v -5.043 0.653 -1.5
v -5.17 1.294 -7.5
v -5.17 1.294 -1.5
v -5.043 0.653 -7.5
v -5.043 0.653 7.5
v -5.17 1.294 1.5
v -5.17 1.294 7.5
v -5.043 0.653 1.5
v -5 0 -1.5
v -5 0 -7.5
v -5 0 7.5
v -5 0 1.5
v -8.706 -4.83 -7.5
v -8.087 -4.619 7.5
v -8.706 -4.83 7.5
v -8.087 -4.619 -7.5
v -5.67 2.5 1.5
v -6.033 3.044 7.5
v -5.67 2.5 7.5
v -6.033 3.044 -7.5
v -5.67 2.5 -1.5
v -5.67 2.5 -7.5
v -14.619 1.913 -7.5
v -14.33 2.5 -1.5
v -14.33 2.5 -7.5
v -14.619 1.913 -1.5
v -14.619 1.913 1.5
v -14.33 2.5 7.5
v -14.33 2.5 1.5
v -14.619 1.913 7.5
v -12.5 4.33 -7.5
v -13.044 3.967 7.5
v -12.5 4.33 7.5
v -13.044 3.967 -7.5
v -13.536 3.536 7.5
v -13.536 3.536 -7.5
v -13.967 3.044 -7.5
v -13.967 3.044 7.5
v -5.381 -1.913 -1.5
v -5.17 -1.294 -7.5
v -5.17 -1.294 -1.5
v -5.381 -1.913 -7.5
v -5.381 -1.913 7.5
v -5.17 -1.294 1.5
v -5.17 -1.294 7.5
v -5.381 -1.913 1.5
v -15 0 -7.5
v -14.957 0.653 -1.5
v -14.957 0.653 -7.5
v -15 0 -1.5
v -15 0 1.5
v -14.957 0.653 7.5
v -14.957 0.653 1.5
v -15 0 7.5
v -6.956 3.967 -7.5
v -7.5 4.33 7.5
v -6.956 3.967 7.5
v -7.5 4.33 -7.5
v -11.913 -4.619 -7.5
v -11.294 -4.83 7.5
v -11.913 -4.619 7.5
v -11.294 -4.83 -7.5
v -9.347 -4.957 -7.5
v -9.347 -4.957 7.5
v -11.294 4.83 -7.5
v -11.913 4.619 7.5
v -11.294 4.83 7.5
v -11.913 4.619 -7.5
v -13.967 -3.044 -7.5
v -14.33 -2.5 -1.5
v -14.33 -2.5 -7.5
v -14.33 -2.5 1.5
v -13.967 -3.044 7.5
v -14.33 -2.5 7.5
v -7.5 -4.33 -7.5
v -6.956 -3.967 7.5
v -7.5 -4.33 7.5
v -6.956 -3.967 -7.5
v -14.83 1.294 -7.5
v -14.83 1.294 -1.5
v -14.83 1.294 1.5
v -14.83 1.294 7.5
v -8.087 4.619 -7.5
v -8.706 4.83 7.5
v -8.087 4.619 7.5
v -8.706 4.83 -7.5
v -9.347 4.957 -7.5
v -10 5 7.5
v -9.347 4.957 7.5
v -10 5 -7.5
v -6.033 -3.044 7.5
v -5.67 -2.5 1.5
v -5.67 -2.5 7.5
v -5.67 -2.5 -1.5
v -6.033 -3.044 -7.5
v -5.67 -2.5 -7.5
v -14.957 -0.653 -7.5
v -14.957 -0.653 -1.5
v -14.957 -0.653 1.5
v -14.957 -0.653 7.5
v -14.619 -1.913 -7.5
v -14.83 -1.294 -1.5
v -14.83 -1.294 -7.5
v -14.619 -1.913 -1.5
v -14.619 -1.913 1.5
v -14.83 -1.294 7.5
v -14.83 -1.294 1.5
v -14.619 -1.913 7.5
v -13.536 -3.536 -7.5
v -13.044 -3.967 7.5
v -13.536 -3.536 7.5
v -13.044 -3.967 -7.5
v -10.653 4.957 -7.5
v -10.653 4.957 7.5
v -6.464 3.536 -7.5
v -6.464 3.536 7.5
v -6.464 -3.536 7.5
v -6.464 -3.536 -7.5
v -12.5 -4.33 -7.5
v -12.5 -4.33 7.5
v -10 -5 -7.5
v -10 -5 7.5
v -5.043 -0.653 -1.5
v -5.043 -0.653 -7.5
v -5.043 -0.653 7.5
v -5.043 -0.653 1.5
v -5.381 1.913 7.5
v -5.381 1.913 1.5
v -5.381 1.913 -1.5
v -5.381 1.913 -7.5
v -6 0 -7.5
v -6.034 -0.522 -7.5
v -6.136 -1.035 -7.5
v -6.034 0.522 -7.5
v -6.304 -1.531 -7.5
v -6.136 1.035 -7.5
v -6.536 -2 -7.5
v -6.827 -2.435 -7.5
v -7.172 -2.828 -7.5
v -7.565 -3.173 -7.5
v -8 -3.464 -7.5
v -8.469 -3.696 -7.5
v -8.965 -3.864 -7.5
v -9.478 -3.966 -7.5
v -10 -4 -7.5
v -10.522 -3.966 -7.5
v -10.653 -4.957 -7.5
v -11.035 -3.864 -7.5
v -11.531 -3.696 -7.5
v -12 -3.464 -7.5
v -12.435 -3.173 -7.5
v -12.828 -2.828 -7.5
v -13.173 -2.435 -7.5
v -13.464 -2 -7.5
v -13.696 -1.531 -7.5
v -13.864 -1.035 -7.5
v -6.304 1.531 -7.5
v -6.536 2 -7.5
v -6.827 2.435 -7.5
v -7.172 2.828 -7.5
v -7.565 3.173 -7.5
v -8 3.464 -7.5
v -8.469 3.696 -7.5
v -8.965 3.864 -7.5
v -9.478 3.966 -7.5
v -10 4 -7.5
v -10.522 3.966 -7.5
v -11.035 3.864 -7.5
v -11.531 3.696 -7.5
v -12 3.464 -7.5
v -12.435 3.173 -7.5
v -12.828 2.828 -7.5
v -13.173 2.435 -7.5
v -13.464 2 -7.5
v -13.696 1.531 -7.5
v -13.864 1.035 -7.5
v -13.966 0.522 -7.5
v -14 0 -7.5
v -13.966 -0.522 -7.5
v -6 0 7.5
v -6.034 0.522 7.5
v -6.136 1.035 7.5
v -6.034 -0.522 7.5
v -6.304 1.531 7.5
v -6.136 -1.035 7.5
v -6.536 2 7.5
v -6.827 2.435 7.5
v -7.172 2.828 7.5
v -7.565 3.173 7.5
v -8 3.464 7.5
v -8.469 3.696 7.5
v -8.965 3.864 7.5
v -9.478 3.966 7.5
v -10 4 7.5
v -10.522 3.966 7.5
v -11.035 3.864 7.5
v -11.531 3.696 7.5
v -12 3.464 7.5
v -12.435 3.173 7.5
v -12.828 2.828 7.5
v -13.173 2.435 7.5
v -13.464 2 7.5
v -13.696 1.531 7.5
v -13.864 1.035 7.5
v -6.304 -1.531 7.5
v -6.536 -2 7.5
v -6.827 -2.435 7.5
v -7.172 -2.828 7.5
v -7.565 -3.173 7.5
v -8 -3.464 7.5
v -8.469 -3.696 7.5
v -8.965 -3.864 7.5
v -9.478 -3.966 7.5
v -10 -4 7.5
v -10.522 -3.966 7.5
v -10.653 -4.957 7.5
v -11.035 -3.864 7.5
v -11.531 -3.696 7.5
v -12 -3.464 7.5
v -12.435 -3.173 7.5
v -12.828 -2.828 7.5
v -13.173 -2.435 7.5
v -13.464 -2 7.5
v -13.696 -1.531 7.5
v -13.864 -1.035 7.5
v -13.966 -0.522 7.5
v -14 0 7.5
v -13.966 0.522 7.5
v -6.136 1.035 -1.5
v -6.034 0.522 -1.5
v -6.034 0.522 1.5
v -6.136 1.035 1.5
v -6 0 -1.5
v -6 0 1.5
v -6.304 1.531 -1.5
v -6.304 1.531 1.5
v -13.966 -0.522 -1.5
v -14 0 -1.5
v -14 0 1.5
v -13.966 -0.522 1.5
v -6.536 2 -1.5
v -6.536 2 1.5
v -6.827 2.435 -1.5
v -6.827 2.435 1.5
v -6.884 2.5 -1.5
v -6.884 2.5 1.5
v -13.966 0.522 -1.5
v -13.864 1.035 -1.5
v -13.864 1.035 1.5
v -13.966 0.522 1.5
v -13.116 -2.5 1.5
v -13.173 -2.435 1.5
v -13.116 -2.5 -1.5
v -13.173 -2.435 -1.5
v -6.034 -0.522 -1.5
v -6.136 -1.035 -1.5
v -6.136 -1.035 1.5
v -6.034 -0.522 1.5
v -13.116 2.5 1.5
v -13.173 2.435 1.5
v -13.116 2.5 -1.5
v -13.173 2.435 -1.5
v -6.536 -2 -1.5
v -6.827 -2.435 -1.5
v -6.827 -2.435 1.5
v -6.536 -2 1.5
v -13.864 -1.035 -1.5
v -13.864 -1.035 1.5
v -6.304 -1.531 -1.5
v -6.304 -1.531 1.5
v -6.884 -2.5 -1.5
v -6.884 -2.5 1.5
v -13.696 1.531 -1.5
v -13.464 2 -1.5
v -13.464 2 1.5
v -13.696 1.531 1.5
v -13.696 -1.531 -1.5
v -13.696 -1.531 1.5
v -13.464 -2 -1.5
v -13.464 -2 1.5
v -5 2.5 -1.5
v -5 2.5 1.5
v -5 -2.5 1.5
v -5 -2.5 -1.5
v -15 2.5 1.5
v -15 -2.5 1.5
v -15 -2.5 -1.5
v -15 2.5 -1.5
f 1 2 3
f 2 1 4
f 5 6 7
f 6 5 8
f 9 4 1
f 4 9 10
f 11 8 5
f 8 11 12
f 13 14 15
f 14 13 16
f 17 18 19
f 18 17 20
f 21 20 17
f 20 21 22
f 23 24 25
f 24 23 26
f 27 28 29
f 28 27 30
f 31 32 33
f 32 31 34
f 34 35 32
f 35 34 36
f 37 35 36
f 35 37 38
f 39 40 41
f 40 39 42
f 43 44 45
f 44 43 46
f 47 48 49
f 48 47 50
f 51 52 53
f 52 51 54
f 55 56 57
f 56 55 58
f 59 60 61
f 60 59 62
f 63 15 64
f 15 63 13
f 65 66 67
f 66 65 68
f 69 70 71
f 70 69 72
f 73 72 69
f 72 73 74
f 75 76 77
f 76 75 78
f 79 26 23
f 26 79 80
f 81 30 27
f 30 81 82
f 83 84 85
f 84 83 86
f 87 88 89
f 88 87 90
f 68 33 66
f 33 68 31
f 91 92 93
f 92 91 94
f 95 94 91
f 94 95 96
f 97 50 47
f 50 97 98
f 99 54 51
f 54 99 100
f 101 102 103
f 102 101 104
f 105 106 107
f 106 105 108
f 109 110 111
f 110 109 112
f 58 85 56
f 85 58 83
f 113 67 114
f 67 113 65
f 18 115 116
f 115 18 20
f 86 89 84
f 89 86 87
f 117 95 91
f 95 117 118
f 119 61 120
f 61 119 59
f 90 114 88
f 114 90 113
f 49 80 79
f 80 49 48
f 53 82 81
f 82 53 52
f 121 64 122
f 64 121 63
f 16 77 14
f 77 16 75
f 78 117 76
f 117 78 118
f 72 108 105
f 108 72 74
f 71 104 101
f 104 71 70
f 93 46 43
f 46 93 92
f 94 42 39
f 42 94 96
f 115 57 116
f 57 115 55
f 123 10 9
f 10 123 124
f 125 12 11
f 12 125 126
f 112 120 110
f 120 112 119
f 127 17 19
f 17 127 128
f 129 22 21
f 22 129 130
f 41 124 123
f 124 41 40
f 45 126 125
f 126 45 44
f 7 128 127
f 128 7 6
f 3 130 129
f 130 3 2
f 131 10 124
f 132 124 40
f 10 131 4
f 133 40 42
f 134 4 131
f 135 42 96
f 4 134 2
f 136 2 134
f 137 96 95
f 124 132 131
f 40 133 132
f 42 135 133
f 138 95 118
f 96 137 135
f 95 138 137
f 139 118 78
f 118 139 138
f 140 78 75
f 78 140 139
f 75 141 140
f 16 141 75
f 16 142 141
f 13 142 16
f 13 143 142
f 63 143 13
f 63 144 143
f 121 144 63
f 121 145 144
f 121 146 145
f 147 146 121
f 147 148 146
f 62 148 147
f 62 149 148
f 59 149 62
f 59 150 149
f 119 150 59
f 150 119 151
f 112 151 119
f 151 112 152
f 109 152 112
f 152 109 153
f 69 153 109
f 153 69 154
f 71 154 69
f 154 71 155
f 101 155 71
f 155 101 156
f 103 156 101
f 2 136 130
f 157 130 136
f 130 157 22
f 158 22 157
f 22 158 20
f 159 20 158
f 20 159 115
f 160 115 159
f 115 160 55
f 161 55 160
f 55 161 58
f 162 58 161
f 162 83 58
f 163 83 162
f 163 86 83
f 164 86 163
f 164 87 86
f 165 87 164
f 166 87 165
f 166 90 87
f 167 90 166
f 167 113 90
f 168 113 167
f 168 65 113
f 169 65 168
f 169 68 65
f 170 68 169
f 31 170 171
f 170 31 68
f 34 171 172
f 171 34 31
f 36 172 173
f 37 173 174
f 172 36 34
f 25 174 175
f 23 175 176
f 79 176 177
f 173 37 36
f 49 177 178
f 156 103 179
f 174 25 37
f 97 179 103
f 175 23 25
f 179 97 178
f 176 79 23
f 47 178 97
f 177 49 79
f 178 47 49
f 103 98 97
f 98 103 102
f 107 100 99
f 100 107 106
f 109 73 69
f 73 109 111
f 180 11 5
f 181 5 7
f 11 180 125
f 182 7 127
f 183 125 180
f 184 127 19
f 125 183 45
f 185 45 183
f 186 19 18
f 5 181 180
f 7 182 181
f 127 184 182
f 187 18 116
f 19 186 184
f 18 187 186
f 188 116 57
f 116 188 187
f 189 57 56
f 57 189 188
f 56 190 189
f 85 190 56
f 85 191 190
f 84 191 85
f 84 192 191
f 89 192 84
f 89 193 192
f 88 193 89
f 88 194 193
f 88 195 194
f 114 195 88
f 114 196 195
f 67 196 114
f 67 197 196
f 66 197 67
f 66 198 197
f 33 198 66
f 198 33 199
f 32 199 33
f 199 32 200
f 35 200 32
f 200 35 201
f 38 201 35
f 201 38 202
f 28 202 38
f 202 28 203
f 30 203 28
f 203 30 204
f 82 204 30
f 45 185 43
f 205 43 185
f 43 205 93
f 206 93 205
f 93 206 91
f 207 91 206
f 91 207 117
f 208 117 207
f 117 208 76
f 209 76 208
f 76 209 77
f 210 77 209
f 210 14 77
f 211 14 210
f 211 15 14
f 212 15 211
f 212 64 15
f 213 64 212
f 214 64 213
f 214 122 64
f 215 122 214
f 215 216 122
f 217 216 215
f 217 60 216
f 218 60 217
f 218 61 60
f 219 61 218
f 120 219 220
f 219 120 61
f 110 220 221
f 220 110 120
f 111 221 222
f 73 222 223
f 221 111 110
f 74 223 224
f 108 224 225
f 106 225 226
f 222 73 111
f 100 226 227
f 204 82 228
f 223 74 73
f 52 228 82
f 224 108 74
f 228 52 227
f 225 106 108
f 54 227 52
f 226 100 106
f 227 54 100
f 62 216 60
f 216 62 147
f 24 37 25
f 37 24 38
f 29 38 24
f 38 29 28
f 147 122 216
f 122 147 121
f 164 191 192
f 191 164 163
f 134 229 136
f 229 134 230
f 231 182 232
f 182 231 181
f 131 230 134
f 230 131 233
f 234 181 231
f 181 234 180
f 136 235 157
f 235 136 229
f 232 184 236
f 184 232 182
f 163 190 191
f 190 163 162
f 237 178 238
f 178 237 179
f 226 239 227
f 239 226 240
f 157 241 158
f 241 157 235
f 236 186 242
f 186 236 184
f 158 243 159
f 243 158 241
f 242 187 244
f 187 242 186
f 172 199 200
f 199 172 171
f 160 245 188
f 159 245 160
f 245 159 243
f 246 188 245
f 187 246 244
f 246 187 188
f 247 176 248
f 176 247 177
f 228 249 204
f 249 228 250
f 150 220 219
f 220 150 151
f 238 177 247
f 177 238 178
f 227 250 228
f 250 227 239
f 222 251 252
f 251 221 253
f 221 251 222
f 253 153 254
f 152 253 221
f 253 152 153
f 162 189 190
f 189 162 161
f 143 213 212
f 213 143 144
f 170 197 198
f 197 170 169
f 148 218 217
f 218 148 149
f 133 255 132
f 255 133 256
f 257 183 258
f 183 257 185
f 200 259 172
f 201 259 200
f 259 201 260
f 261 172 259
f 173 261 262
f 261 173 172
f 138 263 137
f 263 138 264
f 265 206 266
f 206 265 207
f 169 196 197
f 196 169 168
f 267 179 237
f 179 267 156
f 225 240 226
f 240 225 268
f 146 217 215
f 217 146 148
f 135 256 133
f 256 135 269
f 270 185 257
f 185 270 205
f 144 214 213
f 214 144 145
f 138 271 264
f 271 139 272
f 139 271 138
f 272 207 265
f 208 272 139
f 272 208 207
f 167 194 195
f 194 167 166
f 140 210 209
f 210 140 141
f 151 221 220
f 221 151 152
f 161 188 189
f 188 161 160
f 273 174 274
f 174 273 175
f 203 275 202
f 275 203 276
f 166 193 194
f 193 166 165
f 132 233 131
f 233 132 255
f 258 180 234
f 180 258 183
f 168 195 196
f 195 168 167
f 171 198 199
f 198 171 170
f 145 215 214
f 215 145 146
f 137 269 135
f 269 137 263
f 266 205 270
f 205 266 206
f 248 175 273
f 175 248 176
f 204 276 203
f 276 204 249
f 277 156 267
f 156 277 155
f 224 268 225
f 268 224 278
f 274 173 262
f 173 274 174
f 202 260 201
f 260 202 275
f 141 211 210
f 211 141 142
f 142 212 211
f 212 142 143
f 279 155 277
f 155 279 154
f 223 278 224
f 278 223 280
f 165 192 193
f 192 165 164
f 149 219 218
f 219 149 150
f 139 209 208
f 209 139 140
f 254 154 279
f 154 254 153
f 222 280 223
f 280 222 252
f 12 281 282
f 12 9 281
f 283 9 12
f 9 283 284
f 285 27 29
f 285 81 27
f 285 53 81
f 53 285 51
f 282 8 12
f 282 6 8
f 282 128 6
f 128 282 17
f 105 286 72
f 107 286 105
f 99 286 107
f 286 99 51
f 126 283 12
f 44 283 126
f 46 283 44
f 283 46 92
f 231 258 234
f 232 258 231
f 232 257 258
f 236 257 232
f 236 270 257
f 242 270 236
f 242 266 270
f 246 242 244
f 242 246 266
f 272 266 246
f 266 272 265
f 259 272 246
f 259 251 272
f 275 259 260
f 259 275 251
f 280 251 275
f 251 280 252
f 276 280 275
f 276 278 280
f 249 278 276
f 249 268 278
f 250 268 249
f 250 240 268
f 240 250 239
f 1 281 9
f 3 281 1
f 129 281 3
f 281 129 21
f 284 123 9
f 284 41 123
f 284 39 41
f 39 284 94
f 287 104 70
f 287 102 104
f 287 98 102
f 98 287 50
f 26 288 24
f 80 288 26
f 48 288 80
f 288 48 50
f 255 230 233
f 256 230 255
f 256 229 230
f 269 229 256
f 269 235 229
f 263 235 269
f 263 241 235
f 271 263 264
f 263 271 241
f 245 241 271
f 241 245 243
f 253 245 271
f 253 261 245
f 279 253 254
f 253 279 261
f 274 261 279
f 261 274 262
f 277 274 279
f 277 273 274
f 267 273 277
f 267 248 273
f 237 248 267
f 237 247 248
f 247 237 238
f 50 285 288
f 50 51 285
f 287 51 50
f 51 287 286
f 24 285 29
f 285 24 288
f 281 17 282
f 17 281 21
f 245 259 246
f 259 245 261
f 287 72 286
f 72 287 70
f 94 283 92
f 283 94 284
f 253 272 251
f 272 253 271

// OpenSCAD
// Generated by SolidPython 1.1.3 on 2022-06-02 18:59:17
$fn = 48;


union() {
	translate(v = [-10, 0, 0]) {
		cube(center = true, size = [10, 5, 3]);
	}
	translate(v = [-10, 0, 0]) {
		difference() {
			cylinder(center = true, h = 15, r = 5);
			cylinder(center = true, h = 16, r = 4);
		}
	}
}
/***********************************************
*********      SolidPython code:      **********
************************************************
 
#! /usr/bin/env python3
import sys

from solid import scad_render_to_file
from solid.objects import cube, cylinder, difference, translate, union
from solid.utils import right

SEGMENTS = 48


def basic_geometry():
    # SolidPython code can look a lot like OpenSCAD code.  It also has
    # some syntactic sugar built in that can make it look more pythonic.
    # Here are two identical pieces of geometry, one left and one right.

    # left_piece uses standard OpenSCAD grammar (note the commas between
    # block elements; OpenSCAD doesn't require this)
    left_piece = union()(
            translate((-10, 0, 0))(
                    cube([10, 5, 3], center=True)
            ),
            translate((-10, 0, 0))(
                    difference()(
                            cylinder(r=5, h=15, center=True),
                            cylinder(r=4, h=16, center=True)
                    )
            )
    )

    return left_piece



out_dir = sys.argv[1] if len(sys.argv) > 1 else None

a = basic_geometry()

# Adding the file_header argument as shown allows you to change
# the detail of arcs by changing the SEGMENTS variable.  This can
# be expensive when making lots of small curves, but is otherwise
# useful.
file_out = scad_render_to_file(a, out_dir=out_dir, file_header=f'$fn = {SEGMENTS};')
print(f"{__file__}: SCAD file written to: \n{file_out}")
 
 
************************************************/
